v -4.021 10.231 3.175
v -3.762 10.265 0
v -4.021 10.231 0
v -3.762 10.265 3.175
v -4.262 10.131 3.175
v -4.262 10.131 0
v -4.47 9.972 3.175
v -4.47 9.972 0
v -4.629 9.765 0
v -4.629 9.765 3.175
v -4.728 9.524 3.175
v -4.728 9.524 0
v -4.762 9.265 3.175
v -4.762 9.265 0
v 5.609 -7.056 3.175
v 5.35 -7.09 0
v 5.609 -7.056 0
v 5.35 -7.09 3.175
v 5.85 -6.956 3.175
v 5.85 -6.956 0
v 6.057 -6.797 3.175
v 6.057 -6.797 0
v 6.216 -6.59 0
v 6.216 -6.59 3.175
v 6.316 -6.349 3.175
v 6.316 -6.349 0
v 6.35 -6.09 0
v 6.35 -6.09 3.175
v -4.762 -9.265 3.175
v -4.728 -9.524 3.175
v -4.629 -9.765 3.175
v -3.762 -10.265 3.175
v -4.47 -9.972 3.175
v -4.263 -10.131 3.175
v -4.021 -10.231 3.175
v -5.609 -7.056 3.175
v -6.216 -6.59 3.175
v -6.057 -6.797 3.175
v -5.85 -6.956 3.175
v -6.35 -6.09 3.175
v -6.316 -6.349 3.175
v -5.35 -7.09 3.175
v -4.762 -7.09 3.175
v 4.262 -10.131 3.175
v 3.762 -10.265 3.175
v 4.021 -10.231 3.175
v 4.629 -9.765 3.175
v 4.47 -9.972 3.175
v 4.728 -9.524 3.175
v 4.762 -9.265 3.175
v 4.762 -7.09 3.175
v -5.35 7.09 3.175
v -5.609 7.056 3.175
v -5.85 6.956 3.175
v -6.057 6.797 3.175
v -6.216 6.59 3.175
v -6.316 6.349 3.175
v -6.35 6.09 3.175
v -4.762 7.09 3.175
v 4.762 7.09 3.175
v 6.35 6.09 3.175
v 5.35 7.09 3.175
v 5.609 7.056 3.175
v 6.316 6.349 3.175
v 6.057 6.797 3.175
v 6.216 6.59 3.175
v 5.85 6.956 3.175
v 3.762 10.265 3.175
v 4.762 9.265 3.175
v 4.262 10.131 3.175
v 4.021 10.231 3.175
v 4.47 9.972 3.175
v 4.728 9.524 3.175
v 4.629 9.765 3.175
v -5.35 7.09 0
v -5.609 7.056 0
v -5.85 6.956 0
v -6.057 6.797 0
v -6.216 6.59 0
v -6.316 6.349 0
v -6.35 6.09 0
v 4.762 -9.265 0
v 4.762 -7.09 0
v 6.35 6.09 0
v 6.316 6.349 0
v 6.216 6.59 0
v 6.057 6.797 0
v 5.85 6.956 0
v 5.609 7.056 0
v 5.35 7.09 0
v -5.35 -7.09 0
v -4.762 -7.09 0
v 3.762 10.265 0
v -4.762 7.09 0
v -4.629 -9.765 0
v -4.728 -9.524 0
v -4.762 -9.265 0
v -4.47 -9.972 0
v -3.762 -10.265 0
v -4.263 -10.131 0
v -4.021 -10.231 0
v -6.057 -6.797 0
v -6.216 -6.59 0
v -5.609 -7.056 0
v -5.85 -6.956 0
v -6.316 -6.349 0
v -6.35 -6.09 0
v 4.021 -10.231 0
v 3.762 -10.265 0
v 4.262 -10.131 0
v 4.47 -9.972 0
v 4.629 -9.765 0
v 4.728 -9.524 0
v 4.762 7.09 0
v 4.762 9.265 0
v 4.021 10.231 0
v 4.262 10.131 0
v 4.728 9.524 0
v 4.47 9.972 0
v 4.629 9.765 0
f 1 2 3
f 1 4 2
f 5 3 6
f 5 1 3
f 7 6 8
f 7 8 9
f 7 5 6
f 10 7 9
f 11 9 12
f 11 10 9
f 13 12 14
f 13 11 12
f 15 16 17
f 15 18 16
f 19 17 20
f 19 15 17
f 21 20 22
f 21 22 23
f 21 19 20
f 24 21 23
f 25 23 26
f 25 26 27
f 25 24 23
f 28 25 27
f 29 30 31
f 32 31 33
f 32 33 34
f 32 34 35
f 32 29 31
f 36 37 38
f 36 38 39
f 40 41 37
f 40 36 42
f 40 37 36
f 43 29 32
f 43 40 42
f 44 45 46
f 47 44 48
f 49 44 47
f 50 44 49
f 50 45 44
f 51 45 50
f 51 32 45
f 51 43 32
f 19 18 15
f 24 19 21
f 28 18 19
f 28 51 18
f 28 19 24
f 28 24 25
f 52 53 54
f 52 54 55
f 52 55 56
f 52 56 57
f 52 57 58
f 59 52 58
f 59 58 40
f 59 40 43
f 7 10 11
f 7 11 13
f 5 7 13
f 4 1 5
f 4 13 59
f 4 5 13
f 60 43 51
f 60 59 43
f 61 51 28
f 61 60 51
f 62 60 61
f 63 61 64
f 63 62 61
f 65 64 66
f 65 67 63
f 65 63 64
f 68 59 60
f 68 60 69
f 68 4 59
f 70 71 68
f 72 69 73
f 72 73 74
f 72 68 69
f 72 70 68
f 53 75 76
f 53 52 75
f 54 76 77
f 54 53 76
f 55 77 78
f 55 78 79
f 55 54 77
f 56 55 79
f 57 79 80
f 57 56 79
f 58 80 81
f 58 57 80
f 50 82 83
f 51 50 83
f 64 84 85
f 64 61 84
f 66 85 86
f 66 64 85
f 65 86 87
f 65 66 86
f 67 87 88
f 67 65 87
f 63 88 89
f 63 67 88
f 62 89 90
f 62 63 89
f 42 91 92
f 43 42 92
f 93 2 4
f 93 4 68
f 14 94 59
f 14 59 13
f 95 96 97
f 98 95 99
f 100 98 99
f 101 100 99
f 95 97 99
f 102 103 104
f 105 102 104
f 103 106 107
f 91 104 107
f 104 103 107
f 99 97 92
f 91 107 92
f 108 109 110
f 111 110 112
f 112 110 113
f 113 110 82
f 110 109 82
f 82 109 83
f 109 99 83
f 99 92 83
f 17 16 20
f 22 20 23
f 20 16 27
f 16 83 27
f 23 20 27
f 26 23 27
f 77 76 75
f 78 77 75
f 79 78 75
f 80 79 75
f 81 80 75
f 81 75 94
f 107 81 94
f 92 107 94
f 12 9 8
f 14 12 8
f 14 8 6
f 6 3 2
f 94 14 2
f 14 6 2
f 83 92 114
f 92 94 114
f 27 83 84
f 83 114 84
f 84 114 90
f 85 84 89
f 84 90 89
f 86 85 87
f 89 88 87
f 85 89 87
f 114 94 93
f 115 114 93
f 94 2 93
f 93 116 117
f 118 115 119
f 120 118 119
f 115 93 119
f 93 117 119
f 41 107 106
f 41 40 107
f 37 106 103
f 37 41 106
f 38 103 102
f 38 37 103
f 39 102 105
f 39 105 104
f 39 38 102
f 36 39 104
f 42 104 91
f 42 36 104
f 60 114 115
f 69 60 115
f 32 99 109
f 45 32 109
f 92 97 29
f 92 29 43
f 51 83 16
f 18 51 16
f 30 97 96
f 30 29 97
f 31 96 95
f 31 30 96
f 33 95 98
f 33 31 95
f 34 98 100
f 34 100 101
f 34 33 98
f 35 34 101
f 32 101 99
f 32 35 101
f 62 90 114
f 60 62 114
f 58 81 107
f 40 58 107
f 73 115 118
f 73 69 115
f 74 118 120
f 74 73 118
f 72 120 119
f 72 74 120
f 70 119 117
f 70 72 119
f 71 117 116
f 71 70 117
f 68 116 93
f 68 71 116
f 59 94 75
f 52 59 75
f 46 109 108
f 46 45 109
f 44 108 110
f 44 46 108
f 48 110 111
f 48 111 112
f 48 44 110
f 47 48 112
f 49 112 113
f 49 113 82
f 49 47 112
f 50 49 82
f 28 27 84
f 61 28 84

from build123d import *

# Parameters (mm, degrees)
SKETCH1_W           = 9.525
SKETCH1_H           = 3.175
BOSS_EXTRUDE1_DEPTH = 3.175
FILLET1_R           = 1


with BuildPart() as part:
    # Sketch1 → Boss-Extrude1 (new body)
    with BuildSketch(Plane.XY):
        with Locations((0, -8.6775)):
            Rectangle(SKETCH1_W, SKETCH1_H)
        Polygon((4.7625, 7.09), (-4.7625, 7.09), (-6.35, 7.09), (-6.35, -7.09), (-4.7625, -7.09), (4.7625, -7.09), (6.35, -7.09), (6.35, 7.09), align=None)
        with Locations((0, 8.6775)):
            Rectangle(SKETCH1_W, SKETCH1_H)
    extrude(amount=BOSS_EXTRUDE1_DEPTH)

    # Fillet1
    fillet1_edges = [part.edges().sort_by_distance(p)[0] for p in [
        (-6.35, -7.09, 1.5875),
        (-6.35, 7.09, 1.5875),
        (-4.7625, 10.265, 1.5875),
        (4.7625, 10.265, 1.5875),
        (6.35, 7.09, 1.5875),
        (6.35, -7.09, 1.5875),
        (4.7625, -10.265, 1.5875),
        (-4.7625, -10.265, 1.5875),
    ]]
    fillet(fillet1_edges, radius=FILLET1_R)


solid = part.part
